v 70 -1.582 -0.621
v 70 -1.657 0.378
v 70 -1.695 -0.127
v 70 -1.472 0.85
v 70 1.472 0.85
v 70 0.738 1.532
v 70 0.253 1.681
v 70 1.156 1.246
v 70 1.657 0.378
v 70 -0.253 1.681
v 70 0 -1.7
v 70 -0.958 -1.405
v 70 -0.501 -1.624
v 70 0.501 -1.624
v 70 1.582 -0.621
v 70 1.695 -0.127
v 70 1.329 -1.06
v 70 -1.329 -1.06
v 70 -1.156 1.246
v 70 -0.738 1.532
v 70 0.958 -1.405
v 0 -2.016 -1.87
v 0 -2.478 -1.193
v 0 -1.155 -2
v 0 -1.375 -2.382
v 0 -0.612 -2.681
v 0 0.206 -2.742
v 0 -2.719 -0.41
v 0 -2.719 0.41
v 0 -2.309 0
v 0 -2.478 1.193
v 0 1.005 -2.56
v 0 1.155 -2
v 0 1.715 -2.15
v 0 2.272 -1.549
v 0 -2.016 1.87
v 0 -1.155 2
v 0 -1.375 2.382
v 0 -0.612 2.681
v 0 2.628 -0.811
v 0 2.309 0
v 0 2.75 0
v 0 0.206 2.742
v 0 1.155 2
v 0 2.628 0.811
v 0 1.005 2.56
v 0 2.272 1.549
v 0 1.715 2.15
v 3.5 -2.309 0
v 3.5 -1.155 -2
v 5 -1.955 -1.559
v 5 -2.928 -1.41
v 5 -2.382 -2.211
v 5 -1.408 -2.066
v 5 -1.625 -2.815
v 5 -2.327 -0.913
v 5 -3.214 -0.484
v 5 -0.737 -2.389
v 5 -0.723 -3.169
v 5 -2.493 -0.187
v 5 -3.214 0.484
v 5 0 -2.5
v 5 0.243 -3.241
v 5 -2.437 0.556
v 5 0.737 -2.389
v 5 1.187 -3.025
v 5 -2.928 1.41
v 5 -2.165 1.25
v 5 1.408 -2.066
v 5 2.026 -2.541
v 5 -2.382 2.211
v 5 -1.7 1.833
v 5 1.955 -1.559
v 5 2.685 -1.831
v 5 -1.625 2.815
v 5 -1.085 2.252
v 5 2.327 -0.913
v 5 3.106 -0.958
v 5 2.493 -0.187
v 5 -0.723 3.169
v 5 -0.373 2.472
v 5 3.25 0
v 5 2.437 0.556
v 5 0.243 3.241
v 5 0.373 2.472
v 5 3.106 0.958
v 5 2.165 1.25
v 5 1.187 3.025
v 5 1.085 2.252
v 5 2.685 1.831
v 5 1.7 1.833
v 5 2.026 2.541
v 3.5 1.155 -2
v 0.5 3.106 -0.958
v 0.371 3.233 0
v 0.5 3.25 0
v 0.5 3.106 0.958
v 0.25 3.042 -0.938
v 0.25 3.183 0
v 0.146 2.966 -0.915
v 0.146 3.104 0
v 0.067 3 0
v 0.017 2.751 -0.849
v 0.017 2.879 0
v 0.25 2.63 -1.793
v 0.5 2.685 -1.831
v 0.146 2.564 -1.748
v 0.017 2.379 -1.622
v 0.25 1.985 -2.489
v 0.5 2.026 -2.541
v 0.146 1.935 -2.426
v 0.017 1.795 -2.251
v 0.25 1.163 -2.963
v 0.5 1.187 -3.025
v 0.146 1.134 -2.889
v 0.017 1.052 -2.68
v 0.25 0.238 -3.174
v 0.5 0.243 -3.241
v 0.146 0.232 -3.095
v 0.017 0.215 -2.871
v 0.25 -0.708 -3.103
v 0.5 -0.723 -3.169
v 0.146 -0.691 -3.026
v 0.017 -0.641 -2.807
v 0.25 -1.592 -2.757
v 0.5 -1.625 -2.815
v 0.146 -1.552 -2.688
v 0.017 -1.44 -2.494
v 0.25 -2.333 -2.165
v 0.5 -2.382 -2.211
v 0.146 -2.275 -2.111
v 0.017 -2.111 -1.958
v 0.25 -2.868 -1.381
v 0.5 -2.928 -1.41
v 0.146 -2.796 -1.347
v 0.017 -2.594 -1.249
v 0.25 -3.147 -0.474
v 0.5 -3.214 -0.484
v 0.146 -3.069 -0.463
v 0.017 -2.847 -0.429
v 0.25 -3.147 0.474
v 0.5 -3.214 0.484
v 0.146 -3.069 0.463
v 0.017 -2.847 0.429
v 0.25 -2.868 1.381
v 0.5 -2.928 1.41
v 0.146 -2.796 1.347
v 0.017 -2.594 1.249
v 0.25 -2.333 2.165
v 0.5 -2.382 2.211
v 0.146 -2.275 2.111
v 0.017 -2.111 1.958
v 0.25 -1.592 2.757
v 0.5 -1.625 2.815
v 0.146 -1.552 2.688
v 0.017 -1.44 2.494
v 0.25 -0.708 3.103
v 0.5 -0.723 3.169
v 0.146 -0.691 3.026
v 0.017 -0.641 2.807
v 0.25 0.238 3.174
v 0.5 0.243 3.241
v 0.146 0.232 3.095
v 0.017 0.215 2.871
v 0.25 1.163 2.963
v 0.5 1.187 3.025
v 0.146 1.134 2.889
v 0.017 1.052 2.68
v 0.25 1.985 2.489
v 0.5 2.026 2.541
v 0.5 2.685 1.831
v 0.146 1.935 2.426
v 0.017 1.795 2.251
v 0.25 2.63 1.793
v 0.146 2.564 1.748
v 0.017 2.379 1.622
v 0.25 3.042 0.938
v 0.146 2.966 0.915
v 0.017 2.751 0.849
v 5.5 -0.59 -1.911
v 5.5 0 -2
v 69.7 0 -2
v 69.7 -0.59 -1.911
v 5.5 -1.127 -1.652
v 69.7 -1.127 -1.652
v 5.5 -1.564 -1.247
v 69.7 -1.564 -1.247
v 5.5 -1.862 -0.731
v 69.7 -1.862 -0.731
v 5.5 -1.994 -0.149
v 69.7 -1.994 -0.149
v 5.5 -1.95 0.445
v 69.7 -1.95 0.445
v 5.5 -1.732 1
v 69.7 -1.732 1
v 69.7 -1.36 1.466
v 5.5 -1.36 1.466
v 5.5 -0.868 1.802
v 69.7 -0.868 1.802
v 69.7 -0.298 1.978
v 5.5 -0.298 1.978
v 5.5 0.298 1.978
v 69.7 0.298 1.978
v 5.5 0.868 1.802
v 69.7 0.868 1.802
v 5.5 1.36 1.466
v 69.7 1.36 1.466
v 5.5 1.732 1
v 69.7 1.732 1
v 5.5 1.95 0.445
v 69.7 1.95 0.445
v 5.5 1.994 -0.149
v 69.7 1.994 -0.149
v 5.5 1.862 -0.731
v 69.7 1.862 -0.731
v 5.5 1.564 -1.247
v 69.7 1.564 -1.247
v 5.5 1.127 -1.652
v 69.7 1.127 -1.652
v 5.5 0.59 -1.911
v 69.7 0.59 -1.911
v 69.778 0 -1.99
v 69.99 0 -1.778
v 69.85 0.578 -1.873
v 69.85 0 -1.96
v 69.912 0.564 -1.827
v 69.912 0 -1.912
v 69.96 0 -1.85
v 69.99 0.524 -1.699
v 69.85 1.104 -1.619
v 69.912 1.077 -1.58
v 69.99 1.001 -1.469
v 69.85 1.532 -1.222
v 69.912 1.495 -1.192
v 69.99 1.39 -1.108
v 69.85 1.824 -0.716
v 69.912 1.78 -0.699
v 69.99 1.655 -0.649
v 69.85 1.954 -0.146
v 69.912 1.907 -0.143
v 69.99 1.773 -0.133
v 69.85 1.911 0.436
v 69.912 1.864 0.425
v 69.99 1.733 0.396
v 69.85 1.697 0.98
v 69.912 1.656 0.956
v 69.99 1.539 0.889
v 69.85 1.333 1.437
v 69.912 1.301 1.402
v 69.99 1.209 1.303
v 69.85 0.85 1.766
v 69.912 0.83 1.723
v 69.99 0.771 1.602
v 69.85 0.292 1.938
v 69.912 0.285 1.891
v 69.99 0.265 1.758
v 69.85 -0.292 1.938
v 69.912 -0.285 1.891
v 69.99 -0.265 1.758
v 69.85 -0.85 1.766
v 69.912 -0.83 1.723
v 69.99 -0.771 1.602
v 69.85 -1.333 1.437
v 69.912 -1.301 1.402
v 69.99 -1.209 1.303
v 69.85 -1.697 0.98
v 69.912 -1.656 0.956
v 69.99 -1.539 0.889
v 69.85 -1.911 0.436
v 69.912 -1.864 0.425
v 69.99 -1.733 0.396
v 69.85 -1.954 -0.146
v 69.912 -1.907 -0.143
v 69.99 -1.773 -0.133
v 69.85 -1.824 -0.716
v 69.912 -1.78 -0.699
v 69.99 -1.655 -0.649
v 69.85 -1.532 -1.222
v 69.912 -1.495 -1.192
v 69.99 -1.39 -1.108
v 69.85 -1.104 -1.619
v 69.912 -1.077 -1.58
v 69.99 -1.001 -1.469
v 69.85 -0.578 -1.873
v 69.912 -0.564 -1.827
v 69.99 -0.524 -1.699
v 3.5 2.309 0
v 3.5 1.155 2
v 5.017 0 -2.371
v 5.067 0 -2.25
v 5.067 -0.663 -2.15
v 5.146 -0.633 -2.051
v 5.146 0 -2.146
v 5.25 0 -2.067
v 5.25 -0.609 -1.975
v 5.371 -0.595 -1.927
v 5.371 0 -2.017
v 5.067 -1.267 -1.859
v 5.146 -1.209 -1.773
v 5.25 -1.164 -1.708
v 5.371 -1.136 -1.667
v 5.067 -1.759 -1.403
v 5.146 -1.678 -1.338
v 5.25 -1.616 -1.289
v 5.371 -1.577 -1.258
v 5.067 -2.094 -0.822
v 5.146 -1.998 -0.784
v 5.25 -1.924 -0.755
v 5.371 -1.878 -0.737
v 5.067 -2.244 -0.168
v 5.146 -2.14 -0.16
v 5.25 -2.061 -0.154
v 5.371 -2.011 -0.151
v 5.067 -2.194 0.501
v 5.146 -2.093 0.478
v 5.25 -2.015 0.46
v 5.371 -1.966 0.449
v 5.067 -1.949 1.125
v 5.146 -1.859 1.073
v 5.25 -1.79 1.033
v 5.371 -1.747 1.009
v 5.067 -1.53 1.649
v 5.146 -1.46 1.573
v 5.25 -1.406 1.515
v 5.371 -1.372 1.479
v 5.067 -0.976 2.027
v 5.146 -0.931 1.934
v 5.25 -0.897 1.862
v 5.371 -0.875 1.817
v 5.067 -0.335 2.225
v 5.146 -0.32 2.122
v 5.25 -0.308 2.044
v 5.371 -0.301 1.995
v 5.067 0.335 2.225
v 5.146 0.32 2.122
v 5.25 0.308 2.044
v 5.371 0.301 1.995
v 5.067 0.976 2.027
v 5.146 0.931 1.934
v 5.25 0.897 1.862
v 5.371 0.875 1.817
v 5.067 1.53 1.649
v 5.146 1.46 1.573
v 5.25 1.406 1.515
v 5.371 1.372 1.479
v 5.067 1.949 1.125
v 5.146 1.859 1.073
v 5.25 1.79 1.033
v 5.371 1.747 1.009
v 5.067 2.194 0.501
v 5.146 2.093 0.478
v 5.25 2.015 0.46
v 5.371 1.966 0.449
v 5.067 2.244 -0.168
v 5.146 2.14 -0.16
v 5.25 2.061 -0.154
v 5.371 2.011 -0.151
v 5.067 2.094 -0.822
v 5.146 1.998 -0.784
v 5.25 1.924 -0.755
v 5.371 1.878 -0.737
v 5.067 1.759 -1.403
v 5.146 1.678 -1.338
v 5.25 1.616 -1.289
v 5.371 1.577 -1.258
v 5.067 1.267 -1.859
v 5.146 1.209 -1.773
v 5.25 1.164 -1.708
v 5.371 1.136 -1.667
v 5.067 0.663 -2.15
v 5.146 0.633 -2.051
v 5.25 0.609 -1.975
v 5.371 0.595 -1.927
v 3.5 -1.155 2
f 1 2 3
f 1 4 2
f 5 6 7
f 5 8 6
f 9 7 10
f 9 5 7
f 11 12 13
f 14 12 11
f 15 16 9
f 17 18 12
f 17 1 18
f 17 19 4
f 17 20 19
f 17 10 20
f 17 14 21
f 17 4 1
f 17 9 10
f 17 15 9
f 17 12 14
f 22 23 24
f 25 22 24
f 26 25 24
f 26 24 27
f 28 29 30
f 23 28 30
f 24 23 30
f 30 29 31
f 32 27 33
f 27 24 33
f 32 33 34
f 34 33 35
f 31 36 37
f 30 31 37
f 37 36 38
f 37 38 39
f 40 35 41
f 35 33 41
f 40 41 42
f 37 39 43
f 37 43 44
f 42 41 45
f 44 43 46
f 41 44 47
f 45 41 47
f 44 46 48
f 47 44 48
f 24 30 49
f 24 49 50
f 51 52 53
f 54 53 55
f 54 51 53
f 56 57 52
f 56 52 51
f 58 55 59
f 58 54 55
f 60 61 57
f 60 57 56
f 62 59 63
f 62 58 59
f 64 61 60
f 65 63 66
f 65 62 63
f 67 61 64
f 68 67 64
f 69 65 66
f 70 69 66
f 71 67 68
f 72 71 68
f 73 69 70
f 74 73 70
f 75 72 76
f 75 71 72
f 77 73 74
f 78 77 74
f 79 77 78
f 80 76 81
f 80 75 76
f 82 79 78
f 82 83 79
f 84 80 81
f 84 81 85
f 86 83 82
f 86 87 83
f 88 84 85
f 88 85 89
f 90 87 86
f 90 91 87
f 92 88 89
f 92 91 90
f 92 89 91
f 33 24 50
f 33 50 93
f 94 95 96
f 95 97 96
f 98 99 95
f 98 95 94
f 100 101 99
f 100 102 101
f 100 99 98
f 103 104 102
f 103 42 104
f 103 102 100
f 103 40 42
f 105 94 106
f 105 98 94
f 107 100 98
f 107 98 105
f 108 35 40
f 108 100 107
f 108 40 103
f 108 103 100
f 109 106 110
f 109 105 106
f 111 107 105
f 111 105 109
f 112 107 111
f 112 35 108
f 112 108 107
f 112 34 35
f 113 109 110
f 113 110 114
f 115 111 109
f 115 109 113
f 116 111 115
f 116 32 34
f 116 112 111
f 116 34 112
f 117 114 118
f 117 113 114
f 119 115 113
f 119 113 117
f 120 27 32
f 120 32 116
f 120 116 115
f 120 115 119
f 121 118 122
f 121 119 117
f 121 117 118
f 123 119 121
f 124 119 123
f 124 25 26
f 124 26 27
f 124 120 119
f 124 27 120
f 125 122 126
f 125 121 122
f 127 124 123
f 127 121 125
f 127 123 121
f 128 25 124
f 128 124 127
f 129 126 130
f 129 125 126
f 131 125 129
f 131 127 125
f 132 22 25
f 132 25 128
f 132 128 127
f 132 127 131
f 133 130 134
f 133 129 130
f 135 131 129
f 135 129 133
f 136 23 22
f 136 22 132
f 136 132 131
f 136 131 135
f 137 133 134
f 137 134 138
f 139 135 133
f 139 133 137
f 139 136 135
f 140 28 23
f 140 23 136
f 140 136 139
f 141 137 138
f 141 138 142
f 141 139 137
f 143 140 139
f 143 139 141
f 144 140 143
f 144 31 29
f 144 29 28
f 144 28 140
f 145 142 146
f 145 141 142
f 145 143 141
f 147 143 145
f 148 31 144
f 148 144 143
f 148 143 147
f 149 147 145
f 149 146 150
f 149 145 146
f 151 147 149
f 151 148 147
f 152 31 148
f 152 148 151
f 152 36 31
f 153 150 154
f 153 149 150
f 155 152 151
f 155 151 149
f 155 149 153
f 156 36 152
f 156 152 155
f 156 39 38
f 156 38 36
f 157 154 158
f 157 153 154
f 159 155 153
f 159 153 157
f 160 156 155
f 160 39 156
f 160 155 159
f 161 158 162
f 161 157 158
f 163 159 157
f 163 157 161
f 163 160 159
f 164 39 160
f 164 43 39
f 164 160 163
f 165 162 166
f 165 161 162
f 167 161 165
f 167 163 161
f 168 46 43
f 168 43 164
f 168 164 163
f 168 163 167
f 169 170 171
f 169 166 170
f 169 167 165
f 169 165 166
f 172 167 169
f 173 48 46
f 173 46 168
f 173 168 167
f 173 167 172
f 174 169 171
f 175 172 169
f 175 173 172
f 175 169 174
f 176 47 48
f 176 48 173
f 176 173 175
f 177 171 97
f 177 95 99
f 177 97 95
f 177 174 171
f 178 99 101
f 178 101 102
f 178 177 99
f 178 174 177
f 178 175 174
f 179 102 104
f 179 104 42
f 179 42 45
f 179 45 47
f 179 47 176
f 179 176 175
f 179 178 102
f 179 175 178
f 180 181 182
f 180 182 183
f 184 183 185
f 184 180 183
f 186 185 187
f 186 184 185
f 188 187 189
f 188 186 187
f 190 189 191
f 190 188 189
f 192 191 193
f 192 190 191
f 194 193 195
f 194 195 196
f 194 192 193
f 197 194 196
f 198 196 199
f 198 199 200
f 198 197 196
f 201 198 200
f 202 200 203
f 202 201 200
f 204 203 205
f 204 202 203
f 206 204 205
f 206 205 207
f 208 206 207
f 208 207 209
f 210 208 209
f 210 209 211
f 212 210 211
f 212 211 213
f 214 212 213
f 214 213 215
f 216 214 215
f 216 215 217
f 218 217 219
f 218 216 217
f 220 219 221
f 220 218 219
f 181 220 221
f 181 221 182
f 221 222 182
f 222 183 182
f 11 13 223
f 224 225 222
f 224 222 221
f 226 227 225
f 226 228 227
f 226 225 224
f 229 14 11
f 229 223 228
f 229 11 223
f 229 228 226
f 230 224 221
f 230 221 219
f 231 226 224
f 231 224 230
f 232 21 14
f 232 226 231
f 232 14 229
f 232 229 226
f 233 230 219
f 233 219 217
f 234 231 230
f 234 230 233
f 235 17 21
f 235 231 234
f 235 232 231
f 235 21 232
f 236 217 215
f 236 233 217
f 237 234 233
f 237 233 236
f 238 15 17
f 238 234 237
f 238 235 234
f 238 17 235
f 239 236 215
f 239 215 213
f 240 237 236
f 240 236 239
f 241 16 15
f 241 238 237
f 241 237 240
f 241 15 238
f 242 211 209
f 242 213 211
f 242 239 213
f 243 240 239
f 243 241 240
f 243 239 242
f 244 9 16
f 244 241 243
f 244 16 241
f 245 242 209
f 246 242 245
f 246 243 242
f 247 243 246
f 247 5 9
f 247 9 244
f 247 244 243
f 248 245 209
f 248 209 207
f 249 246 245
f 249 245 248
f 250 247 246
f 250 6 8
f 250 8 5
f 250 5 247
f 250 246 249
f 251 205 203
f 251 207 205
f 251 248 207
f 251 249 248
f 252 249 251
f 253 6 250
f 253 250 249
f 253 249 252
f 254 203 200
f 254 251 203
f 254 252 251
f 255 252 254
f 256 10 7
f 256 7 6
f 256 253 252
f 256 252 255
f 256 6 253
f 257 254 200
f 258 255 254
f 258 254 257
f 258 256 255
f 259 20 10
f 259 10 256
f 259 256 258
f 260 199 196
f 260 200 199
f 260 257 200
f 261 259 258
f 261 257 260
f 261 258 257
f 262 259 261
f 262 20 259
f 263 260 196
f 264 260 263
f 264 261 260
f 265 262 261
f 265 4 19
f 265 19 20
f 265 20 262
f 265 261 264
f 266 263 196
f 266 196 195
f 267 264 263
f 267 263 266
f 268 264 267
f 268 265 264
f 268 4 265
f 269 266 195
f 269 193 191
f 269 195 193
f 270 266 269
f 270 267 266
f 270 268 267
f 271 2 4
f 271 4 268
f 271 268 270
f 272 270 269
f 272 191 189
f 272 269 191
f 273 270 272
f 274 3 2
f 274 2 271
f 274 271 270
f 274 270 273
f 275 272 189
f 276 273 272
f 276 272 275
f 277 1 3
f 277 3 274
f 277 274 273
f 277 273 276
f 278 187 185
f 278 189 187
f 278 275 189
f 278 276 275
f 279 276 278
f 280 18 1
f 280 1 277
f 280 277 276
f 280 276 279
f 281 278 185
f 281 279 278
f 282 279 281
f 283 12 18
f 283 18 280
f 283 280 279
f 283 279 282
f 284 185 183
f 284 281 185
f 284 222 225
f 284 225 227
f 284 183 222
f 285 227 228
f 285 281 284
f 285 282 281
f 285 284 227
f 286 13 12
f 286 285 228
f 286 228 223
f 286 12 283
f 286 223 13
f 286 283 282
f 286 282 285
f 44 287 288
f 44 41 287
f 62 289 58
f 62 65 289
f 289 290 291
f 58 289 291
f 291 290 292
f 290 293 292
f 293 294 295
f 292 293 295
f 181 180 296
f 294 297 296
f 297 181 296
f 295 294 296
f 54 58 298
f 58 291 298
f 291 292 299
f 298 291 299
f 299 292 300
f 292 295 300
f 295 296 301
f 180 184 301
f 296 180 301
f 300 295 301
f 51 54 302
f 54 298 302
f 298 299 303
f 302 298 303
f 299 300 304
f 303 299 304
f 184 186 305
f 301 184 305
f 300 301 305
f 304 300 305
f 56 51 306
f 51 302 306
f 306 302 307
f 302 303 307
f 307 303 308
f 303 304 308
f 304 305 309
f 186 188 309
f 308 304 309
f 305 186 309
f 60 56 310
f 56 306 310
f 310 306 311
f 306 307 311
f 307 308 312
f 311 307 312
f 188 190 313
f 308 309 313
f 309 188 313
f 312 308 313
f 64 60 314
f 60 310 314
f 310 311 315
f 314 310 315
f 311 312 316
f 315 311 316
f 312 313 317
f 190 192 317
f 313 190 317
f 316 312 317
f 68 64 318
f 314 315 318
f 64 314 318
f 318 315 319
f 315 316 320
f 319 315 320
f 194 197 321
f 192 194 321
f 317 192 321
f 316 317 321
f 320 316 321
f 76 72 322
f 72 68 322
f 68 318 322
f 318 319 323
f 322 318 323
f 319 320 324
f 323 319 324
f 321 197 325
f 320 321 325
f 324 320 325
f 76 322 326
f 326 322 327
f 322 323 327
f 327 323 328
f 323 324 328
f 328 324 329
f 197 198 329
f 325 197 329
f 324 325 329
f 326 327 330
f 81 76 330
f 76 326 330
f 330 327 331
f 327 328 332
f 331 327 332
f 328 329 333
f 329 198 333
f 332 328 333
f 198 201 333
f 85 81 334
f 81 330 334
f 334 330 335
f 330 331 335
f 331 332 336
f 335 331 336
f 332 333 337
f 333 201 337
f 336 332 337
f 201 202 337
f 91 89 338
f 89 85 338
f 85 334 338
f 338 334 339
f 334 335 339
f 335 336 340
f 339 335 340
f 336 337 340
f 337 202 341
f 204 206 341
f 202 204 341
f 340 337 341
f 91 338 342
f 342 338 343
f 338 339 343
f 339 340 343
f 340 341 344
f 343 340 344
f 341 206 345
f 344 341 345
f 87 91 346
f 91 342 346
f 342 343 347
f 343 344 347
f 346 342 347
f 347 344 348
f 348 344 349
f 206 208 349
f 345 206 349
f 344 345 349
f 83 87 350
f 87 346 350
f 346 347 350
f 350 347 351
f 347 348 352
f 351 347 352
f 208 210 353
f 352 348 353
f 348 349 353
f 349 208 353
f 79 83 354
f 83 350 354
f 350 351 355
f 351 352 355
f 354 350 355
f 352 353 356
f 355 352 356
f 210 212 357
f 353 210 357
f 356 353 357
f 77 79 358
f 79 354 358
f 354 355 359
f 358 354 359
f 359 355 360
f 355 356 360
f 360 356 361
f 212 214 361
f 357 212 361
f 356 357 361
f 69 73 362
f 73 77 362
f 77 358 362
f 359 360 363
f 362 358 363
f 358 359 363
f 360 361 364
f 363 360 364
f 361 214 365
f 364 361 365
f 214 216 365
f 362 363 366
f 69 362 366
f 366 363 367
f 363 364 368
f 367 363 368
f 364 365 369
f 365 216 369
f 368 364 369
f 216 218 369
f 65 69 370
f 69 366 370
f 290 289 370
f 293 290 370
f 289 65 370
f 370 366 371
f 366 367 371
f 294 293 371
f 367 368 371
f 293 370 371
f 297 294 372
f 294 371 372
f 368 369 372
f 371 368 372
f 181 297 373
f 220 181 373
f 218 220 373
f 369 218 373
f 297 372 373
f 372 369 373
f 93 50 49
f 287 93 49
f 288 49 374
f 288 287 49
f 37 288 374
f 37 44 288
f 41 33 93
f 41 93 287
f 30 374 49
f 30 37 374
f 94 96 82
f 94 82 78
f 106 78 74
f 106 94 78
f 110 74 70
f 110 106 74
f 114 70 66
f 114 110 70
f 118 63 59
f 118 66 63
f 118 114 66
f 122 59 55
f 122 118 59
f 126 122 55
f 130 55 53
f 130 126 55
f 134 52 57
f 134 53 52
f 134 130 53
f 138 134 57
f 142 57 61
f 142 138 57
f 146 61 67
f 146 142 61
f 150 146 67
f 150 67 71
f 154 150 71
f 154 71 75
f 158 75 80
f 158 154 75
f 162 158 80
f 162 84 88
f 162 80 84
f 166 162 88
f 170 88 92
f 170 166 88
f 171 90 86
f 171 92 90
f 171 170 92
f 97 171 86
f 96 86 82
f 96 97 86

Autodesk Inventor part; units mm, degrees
ref_plane "YZ Plane" through (0, 0, 0) normal (1, 0, 0) x (0, 1, 0)
ref_plane "XZ Plane" through (0, 0, 0) normal (0, 1, 0) x (-1, 0, 0)
ref_plane "XY Plane" through (0, 0, 0) normal (0, 0, 1) x (1, 0, 0)
sketch "Sketch1" plane through (0, 0, 0) normal (1, 0, 0) x (0, 1, 0)
  circle A0 centre (0, 0) radius 3.25
  circle A1 centre (0, 0) radius 2
  dimension "d0" = 6.5
  dimension "d1" = 4
extrude "Extrusion1" add sketch "Sketch1" along normal blind 5 contours A0 | A1
sketch "Sketch2" plane through (5, 0, 0) normal (1, 0, 0) x (0, 0, -1)
  circle A0 centre (0, 0) radius 2
  dimension "d4" = 4
extrude "Extrusion2" add sketch "Sketch2" along normal blind 70
sketch "Sketch3" plane through (0, 0, 0) normal (-1, 0, 0) x (0, 0, 1)
  circle A0 centre (0, 0) radius 2 projected
  line L0 (2, -1.1547) -> (0, -2.3094)
  line L1 (0, -2.3094) -> (-2, -1.1547)
  line L2 (-2, -1.1547) -> (-2, 1.1547)
  line L3 (-2, 1.1547) -> (0, 2.3094)
  line L4 (0, 2.3094) -> (2, 1.1547)
  line L5 (2, 1.1547) -> (2, -1.1547)
  point P0 (2, 0)
extrude "Extrusion3" cut sketch "Sketch3" against normal blind 3.5
thread "Thread1" size "M4x0.7" class "6g" standard "ANSI Metric M Profile" length 15
fillet "Fillet1" radius 0.5 3 edges at (5, 0, 2) (0, -3.25, 0) (75, 0, 2)
sketch "Sketch4" plane through (75, 0, 0) normal (1, 0, 0) x (0, 0, -1)
  line L0 (-7.7054, 6.4284) -> (8.1646, 6.4284)
  line L1 (8.1646, 6.4284) -> (8.1646, -6.8875)
  line L2 (8.1646, -6.8875) -> (-7.7054, -6.8875)
  line L3 (-7.7054, -6.8875) -> (-7.7054, 6.4284)
  point P0 (0, 0)
extrude "Extrusion4" cut sketch "Sketch4" against normal blind 5
fillet "Fillet2" radius 0.3 1 edges at (70, 0, 2)
properties part number "m4x70_example" material "Stainless Steel"
